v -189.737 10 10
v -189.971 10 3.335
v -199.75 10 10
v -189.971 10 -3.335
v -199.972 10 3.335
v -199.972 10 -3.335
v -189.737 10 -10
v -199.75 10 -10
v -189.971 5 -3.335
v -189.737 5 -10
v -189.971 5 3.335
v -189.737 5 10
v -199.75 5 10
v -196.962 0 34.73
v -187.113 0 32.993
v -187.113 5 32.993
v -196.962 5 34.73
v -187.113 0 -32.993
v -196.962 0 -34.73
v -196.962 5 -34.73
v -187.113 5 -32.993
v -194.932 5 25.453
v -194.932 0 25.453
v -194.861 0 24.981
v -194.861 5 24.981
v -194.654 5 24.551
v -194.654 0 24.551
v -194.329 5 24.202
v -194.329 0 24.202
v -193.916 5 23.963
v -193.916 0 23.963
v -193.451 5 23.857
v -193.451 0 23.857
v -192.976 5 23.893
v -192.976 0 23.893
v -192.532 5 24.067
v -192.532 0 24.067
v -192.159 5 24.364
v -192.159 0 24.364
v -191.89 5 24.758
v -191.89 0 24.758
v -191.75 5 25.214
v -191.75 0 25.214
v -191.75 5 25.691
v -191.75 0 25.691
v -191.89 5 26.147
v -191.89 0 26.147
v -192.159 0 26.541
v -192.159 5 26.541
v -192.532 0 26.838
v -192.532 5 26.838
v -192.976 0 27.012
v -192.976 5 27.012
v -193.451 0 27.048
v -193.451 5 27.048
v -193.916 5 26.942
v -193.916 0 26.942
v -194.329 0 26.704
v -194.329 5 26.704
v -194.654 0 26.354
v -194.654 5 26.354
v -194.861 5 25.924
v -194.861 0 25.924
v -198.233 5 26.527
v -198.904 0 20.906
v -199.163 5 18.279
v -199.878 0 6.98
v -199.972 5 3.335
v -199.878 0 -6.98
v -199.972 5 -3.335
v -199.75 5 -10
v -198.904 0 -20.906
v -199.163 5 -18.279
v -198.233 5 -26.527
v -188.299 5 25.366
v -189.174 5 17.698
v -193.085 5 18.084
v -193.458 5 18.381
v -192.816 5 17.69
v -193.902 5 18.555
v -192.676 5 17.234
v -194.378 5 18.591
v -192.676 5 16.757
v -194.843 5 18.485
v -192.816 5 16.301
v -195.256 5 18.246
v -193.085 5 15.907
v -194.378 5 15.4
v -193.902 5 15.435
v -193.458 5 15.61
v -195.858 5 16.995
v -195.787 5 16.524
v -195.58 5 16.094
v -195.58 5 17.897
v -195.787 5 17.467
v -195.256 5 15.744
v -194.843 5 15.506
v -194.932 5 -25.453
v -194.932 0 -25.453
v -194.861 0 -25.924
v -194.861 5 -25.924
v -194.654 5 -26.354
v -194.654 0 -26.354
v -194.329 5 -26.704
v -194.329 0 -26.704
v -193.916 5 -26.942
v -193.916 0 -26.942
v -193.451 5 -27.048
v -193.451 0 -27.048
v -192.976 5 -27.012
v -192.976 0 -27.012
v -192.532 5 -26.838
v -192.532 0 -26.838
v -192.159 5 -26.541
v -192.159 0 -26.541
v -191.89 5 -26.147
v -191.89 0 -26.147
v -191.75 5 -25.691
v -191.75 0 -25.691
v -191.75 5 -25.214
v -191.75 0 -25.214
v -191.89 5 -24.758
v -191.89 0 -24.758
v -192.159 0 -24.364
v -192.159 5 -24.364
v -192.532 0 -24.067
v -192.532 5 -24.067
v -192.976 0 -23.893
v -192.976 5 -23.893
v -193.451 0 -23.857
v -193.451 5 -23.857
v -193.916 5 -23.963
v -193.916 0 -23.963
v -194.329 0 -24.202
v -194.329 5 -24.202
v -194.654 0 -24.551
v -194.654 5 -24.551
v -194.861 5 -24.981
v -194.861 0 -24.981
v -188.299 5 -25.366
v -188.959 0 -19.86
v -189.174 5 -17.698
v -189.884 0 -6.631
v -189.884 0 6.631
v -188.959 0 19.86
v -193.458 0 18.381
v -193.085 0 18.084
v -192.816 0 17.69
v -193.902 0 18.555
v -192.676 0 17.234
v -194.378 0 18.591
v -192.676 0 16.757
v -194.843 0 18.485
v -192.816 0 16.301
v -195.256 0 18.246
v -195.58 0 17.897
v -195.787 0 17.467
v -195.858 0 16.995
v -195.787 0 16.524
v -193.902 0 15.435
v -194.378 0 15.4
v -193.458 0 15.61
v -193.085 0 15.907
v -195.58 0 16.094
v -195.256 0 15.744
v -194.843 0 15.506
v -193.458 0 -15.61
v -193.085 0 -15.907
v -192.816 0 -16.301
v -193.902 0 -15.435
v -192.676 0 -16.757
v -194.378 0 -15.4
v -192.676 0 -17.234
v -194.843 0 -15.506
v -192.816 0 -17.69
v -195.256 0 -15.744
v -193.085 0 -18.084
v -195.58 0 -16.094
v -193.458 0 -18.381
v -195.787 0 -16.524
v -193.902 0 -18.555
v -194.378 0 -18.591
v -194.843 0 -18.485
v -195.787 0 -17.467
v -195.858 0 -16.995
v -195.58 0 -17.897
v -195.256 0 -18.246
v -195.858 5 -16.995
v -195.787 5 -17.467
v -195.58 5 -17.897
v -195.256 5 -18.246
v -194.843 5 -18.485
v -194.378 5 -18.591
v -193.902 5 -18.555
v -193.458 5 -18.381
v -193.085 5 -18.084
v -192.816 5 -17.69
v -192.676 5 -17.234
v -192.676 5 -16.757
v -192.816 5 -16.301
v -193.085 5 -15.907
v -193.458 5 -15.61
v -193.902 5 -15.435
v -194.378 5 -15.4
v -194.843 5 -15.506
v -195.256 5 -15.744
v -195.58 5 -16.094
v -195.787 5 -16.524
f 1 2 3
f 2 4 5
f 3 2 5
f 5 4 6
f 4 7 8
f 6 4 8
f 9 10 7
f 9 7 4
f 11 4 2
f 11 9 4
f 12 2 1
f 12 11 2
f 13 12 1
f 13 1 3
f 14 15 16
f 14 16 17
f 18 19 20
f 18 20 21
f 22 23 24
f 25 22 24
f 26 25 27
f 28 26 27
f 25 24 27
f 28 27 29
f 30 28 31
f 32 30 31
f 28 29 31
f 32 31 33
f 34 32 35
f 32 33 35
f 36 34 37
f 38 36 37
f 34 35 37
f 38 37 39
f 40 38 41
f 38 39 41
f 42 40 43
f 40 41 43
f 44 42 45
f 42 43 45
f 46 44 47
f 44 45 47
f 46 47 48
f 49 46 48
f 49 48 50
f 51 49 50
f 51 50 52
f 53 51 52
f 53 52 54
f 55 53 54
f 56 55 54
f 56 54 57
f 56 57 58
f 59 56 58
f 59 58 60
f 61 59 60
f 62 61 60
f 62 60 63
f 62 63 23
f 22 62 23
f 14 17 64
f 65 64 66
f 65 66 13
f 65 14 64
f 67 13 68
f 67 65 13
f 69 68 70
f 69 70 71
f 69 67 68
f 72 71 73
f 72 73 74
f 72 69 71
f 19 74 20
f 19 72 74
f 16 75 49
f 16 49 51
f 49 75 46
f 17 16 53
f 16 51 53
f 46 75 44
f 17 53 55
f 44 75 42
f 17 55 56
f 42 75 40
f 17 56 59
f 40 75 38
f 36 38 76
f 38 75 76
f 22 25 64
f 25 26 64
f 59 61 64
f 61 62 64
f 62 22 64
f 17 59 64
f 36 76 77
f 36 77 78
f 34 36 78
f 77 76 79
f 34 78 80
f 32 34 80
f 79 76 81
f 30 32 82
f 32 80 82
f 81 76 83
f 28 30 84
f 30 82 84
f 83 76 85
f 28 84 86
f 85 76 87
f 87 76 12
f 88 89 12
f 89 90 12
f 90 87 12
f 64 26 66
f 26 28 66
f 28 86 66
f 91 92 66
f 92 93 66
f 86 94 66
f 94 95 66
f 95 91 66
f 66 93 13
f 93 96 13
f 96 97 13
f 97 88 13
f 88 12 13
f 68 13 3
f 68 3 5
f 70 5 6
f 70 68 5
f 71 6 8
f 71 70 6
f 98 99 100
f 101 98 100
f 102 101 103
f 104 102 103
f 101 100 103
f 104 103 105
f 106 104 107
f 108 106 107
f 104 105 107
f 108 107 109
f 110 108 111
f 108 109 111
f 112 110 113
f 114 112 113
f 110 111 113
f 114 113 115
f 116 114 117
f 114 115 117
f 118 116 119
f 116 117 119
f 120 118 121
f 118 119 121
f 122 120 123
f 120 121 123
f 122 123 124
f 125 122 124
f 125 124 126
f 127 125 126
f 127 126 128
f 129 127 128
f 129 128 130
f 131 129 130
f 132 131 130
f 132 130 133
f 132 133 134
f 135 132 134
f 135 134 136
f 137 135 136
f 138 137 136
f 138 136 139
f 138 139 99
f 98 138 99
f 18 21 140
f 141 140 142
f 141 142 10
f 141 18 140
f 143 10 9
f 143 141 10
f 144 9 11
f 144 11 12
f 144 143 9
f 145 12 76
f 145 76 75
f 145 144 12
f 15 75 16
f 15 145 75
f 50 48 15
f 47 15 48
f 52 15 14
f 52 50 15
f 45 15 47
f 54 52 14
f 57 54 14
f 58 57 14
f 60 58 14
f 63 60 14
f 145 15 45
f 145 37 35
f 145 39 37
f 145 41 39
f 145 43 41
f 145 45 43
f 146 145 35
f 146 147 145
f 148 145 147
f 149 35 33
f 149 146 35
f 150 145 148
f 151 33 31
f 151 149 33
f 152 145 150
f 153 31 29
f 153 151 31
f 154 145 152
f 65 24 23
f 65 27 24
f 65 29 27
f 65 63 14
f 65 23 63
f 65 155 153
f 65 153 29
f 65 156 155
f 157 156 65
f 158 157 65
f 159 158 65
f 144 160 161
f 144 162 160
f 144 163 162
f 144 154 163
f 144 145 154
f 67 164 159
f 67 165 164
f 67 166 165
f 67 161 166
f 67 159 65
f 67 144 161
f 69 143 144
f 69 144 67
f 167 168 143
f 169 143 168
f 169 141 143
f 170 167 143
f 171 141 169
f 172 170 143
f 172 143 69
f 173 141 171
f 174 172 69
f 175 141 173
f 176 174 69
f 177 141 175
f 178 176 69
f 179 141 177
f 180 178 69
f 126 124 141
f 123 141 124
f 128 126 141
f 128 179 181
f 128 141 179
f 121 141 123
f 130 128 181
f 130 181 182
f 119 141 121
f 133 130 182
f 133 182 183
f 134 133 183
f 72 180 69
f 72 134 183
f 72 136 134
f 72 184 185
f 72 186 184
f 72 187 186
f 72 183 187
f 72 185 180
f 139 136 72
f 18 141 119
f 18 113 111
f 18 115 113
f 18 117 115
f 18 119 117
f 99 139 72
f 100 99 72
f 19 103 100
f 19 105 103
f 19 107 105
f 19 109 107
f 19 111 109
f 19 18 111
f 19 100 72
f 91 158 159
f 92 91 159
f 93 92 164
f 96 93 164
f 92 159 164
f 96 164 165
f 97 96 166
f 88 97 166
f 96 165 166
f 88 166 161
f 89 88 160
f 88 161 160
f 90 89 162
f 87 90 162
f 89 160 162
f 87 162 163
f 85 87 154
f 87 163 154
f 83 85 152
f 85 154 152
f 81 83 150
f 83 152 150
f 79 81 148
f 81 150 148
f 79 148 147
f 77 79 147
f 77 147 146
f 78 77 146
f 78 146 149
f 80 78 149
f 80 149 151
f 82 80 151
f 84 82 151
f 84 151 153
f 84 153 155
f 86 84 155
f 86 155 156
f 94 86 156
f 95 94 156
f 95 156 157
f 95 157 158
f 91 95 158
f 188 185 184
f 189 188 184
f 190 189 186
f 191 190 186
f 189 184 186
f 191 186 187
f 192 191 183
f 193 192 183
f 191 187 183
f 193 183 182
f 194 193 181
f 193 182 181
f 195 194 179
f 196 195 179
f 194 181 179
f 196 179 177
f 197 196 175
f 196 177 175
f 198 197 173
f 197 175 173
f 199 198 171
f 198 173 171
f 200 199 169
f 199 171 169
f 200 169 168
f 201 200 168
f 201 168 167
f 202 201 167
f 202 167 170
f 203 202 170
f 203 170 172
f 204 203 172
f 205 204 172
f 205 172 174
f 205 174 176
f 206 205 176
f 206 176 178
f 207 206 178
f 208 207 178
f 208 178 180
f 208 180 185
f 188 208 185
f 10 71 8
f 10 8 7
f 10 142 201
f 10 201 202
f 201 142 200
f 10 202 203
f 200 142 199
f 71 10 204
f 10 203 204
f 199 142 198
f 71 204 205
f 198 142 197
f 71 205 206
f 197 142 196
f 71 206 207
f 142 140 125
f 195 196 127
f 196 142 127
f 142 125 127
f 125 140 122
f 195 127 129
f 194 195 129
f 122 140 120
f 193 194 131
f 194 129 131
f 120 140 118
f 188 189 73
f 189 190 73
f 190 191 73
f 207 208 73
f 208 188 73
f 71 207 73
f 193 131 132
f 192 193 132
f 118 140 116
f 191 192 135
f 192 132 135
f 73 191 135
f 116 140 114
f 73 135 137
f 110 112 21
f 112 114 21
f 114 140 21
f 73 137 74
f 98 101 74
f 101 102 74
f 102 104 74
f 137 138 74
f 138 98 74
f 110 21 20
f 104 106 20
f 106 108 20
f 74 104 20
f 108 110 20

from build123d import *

# Parameters (mm, degrees)
BOSS_EXTRUDE1_DEPTH        = 5
BOSS_EXTRUDE2_DEPTH        = 5
F_3_2_3_2_DIAMETER_HOLE1_D = 3.2


with BuildPart() as part:
    # Sketch1 → Boss-Extrude1 (new body)
    with BuildSketch(Plane(origin=(0, 0, 0), x_dir=(1, 0, 0), z_dir=(0, 1, 0))):
        with BuildLine():
            Line((-196.961550602, 34.729635533), (-187.113473072, 32.993153757))
            ThreePointArc((-187.113473072, 32.993153757), (-190, 0), (-187.113473072, -32.993153757))
            Line((-187.113473072, -32.993153757), (-196.961550602, -34.729635533))
            ThreePointArc((-196.961550602, -34.729635533), (-200, 0), (-196.961550602, 34.729635533))
        make_face()
    extrude(amount=BOSS_EXTRUDE1_DEPTH)

    # Sketch9 → Boss-Extrude2 (add)
    with BuildSketch(Plane(origin=(0, 5, 0), x_dir=(1, 0, 0), z_dir=(0, 1, 0))):
        with BuildLine():
            Line((-199.749843554, 10), (-189.73665961, 10))
            ThreePointArc((-189.73665961, 10), (-190, 0), (-189.73665961, -10))
            Line((-189.73665961, -10), (-199.749843554, -10))
            ThreePointArc((-199.749843554, -10), (-200, 0), (-199.749843554, 10))
        make_face()
    extrude(amount=BOSS_EXTRUDE2_DEPTH)

    # Ø3.2 (3.2) Diameter Hole1 (through all)
    with Locations(Plane(origin=(0, 5, 0), x_dir=(1, 0, 0), z_dir=(0, 1, 0))):
        with Locations((-194.257966128, 16.995369836), (-193.331747968, 25.452607483), (-194.257966128, -16.995369836), (-193.331747968, -25.452607483)):
            Hole(F_3_2_3_2_DIAMETER_HOLE1_D / 2)


solid = part.part
